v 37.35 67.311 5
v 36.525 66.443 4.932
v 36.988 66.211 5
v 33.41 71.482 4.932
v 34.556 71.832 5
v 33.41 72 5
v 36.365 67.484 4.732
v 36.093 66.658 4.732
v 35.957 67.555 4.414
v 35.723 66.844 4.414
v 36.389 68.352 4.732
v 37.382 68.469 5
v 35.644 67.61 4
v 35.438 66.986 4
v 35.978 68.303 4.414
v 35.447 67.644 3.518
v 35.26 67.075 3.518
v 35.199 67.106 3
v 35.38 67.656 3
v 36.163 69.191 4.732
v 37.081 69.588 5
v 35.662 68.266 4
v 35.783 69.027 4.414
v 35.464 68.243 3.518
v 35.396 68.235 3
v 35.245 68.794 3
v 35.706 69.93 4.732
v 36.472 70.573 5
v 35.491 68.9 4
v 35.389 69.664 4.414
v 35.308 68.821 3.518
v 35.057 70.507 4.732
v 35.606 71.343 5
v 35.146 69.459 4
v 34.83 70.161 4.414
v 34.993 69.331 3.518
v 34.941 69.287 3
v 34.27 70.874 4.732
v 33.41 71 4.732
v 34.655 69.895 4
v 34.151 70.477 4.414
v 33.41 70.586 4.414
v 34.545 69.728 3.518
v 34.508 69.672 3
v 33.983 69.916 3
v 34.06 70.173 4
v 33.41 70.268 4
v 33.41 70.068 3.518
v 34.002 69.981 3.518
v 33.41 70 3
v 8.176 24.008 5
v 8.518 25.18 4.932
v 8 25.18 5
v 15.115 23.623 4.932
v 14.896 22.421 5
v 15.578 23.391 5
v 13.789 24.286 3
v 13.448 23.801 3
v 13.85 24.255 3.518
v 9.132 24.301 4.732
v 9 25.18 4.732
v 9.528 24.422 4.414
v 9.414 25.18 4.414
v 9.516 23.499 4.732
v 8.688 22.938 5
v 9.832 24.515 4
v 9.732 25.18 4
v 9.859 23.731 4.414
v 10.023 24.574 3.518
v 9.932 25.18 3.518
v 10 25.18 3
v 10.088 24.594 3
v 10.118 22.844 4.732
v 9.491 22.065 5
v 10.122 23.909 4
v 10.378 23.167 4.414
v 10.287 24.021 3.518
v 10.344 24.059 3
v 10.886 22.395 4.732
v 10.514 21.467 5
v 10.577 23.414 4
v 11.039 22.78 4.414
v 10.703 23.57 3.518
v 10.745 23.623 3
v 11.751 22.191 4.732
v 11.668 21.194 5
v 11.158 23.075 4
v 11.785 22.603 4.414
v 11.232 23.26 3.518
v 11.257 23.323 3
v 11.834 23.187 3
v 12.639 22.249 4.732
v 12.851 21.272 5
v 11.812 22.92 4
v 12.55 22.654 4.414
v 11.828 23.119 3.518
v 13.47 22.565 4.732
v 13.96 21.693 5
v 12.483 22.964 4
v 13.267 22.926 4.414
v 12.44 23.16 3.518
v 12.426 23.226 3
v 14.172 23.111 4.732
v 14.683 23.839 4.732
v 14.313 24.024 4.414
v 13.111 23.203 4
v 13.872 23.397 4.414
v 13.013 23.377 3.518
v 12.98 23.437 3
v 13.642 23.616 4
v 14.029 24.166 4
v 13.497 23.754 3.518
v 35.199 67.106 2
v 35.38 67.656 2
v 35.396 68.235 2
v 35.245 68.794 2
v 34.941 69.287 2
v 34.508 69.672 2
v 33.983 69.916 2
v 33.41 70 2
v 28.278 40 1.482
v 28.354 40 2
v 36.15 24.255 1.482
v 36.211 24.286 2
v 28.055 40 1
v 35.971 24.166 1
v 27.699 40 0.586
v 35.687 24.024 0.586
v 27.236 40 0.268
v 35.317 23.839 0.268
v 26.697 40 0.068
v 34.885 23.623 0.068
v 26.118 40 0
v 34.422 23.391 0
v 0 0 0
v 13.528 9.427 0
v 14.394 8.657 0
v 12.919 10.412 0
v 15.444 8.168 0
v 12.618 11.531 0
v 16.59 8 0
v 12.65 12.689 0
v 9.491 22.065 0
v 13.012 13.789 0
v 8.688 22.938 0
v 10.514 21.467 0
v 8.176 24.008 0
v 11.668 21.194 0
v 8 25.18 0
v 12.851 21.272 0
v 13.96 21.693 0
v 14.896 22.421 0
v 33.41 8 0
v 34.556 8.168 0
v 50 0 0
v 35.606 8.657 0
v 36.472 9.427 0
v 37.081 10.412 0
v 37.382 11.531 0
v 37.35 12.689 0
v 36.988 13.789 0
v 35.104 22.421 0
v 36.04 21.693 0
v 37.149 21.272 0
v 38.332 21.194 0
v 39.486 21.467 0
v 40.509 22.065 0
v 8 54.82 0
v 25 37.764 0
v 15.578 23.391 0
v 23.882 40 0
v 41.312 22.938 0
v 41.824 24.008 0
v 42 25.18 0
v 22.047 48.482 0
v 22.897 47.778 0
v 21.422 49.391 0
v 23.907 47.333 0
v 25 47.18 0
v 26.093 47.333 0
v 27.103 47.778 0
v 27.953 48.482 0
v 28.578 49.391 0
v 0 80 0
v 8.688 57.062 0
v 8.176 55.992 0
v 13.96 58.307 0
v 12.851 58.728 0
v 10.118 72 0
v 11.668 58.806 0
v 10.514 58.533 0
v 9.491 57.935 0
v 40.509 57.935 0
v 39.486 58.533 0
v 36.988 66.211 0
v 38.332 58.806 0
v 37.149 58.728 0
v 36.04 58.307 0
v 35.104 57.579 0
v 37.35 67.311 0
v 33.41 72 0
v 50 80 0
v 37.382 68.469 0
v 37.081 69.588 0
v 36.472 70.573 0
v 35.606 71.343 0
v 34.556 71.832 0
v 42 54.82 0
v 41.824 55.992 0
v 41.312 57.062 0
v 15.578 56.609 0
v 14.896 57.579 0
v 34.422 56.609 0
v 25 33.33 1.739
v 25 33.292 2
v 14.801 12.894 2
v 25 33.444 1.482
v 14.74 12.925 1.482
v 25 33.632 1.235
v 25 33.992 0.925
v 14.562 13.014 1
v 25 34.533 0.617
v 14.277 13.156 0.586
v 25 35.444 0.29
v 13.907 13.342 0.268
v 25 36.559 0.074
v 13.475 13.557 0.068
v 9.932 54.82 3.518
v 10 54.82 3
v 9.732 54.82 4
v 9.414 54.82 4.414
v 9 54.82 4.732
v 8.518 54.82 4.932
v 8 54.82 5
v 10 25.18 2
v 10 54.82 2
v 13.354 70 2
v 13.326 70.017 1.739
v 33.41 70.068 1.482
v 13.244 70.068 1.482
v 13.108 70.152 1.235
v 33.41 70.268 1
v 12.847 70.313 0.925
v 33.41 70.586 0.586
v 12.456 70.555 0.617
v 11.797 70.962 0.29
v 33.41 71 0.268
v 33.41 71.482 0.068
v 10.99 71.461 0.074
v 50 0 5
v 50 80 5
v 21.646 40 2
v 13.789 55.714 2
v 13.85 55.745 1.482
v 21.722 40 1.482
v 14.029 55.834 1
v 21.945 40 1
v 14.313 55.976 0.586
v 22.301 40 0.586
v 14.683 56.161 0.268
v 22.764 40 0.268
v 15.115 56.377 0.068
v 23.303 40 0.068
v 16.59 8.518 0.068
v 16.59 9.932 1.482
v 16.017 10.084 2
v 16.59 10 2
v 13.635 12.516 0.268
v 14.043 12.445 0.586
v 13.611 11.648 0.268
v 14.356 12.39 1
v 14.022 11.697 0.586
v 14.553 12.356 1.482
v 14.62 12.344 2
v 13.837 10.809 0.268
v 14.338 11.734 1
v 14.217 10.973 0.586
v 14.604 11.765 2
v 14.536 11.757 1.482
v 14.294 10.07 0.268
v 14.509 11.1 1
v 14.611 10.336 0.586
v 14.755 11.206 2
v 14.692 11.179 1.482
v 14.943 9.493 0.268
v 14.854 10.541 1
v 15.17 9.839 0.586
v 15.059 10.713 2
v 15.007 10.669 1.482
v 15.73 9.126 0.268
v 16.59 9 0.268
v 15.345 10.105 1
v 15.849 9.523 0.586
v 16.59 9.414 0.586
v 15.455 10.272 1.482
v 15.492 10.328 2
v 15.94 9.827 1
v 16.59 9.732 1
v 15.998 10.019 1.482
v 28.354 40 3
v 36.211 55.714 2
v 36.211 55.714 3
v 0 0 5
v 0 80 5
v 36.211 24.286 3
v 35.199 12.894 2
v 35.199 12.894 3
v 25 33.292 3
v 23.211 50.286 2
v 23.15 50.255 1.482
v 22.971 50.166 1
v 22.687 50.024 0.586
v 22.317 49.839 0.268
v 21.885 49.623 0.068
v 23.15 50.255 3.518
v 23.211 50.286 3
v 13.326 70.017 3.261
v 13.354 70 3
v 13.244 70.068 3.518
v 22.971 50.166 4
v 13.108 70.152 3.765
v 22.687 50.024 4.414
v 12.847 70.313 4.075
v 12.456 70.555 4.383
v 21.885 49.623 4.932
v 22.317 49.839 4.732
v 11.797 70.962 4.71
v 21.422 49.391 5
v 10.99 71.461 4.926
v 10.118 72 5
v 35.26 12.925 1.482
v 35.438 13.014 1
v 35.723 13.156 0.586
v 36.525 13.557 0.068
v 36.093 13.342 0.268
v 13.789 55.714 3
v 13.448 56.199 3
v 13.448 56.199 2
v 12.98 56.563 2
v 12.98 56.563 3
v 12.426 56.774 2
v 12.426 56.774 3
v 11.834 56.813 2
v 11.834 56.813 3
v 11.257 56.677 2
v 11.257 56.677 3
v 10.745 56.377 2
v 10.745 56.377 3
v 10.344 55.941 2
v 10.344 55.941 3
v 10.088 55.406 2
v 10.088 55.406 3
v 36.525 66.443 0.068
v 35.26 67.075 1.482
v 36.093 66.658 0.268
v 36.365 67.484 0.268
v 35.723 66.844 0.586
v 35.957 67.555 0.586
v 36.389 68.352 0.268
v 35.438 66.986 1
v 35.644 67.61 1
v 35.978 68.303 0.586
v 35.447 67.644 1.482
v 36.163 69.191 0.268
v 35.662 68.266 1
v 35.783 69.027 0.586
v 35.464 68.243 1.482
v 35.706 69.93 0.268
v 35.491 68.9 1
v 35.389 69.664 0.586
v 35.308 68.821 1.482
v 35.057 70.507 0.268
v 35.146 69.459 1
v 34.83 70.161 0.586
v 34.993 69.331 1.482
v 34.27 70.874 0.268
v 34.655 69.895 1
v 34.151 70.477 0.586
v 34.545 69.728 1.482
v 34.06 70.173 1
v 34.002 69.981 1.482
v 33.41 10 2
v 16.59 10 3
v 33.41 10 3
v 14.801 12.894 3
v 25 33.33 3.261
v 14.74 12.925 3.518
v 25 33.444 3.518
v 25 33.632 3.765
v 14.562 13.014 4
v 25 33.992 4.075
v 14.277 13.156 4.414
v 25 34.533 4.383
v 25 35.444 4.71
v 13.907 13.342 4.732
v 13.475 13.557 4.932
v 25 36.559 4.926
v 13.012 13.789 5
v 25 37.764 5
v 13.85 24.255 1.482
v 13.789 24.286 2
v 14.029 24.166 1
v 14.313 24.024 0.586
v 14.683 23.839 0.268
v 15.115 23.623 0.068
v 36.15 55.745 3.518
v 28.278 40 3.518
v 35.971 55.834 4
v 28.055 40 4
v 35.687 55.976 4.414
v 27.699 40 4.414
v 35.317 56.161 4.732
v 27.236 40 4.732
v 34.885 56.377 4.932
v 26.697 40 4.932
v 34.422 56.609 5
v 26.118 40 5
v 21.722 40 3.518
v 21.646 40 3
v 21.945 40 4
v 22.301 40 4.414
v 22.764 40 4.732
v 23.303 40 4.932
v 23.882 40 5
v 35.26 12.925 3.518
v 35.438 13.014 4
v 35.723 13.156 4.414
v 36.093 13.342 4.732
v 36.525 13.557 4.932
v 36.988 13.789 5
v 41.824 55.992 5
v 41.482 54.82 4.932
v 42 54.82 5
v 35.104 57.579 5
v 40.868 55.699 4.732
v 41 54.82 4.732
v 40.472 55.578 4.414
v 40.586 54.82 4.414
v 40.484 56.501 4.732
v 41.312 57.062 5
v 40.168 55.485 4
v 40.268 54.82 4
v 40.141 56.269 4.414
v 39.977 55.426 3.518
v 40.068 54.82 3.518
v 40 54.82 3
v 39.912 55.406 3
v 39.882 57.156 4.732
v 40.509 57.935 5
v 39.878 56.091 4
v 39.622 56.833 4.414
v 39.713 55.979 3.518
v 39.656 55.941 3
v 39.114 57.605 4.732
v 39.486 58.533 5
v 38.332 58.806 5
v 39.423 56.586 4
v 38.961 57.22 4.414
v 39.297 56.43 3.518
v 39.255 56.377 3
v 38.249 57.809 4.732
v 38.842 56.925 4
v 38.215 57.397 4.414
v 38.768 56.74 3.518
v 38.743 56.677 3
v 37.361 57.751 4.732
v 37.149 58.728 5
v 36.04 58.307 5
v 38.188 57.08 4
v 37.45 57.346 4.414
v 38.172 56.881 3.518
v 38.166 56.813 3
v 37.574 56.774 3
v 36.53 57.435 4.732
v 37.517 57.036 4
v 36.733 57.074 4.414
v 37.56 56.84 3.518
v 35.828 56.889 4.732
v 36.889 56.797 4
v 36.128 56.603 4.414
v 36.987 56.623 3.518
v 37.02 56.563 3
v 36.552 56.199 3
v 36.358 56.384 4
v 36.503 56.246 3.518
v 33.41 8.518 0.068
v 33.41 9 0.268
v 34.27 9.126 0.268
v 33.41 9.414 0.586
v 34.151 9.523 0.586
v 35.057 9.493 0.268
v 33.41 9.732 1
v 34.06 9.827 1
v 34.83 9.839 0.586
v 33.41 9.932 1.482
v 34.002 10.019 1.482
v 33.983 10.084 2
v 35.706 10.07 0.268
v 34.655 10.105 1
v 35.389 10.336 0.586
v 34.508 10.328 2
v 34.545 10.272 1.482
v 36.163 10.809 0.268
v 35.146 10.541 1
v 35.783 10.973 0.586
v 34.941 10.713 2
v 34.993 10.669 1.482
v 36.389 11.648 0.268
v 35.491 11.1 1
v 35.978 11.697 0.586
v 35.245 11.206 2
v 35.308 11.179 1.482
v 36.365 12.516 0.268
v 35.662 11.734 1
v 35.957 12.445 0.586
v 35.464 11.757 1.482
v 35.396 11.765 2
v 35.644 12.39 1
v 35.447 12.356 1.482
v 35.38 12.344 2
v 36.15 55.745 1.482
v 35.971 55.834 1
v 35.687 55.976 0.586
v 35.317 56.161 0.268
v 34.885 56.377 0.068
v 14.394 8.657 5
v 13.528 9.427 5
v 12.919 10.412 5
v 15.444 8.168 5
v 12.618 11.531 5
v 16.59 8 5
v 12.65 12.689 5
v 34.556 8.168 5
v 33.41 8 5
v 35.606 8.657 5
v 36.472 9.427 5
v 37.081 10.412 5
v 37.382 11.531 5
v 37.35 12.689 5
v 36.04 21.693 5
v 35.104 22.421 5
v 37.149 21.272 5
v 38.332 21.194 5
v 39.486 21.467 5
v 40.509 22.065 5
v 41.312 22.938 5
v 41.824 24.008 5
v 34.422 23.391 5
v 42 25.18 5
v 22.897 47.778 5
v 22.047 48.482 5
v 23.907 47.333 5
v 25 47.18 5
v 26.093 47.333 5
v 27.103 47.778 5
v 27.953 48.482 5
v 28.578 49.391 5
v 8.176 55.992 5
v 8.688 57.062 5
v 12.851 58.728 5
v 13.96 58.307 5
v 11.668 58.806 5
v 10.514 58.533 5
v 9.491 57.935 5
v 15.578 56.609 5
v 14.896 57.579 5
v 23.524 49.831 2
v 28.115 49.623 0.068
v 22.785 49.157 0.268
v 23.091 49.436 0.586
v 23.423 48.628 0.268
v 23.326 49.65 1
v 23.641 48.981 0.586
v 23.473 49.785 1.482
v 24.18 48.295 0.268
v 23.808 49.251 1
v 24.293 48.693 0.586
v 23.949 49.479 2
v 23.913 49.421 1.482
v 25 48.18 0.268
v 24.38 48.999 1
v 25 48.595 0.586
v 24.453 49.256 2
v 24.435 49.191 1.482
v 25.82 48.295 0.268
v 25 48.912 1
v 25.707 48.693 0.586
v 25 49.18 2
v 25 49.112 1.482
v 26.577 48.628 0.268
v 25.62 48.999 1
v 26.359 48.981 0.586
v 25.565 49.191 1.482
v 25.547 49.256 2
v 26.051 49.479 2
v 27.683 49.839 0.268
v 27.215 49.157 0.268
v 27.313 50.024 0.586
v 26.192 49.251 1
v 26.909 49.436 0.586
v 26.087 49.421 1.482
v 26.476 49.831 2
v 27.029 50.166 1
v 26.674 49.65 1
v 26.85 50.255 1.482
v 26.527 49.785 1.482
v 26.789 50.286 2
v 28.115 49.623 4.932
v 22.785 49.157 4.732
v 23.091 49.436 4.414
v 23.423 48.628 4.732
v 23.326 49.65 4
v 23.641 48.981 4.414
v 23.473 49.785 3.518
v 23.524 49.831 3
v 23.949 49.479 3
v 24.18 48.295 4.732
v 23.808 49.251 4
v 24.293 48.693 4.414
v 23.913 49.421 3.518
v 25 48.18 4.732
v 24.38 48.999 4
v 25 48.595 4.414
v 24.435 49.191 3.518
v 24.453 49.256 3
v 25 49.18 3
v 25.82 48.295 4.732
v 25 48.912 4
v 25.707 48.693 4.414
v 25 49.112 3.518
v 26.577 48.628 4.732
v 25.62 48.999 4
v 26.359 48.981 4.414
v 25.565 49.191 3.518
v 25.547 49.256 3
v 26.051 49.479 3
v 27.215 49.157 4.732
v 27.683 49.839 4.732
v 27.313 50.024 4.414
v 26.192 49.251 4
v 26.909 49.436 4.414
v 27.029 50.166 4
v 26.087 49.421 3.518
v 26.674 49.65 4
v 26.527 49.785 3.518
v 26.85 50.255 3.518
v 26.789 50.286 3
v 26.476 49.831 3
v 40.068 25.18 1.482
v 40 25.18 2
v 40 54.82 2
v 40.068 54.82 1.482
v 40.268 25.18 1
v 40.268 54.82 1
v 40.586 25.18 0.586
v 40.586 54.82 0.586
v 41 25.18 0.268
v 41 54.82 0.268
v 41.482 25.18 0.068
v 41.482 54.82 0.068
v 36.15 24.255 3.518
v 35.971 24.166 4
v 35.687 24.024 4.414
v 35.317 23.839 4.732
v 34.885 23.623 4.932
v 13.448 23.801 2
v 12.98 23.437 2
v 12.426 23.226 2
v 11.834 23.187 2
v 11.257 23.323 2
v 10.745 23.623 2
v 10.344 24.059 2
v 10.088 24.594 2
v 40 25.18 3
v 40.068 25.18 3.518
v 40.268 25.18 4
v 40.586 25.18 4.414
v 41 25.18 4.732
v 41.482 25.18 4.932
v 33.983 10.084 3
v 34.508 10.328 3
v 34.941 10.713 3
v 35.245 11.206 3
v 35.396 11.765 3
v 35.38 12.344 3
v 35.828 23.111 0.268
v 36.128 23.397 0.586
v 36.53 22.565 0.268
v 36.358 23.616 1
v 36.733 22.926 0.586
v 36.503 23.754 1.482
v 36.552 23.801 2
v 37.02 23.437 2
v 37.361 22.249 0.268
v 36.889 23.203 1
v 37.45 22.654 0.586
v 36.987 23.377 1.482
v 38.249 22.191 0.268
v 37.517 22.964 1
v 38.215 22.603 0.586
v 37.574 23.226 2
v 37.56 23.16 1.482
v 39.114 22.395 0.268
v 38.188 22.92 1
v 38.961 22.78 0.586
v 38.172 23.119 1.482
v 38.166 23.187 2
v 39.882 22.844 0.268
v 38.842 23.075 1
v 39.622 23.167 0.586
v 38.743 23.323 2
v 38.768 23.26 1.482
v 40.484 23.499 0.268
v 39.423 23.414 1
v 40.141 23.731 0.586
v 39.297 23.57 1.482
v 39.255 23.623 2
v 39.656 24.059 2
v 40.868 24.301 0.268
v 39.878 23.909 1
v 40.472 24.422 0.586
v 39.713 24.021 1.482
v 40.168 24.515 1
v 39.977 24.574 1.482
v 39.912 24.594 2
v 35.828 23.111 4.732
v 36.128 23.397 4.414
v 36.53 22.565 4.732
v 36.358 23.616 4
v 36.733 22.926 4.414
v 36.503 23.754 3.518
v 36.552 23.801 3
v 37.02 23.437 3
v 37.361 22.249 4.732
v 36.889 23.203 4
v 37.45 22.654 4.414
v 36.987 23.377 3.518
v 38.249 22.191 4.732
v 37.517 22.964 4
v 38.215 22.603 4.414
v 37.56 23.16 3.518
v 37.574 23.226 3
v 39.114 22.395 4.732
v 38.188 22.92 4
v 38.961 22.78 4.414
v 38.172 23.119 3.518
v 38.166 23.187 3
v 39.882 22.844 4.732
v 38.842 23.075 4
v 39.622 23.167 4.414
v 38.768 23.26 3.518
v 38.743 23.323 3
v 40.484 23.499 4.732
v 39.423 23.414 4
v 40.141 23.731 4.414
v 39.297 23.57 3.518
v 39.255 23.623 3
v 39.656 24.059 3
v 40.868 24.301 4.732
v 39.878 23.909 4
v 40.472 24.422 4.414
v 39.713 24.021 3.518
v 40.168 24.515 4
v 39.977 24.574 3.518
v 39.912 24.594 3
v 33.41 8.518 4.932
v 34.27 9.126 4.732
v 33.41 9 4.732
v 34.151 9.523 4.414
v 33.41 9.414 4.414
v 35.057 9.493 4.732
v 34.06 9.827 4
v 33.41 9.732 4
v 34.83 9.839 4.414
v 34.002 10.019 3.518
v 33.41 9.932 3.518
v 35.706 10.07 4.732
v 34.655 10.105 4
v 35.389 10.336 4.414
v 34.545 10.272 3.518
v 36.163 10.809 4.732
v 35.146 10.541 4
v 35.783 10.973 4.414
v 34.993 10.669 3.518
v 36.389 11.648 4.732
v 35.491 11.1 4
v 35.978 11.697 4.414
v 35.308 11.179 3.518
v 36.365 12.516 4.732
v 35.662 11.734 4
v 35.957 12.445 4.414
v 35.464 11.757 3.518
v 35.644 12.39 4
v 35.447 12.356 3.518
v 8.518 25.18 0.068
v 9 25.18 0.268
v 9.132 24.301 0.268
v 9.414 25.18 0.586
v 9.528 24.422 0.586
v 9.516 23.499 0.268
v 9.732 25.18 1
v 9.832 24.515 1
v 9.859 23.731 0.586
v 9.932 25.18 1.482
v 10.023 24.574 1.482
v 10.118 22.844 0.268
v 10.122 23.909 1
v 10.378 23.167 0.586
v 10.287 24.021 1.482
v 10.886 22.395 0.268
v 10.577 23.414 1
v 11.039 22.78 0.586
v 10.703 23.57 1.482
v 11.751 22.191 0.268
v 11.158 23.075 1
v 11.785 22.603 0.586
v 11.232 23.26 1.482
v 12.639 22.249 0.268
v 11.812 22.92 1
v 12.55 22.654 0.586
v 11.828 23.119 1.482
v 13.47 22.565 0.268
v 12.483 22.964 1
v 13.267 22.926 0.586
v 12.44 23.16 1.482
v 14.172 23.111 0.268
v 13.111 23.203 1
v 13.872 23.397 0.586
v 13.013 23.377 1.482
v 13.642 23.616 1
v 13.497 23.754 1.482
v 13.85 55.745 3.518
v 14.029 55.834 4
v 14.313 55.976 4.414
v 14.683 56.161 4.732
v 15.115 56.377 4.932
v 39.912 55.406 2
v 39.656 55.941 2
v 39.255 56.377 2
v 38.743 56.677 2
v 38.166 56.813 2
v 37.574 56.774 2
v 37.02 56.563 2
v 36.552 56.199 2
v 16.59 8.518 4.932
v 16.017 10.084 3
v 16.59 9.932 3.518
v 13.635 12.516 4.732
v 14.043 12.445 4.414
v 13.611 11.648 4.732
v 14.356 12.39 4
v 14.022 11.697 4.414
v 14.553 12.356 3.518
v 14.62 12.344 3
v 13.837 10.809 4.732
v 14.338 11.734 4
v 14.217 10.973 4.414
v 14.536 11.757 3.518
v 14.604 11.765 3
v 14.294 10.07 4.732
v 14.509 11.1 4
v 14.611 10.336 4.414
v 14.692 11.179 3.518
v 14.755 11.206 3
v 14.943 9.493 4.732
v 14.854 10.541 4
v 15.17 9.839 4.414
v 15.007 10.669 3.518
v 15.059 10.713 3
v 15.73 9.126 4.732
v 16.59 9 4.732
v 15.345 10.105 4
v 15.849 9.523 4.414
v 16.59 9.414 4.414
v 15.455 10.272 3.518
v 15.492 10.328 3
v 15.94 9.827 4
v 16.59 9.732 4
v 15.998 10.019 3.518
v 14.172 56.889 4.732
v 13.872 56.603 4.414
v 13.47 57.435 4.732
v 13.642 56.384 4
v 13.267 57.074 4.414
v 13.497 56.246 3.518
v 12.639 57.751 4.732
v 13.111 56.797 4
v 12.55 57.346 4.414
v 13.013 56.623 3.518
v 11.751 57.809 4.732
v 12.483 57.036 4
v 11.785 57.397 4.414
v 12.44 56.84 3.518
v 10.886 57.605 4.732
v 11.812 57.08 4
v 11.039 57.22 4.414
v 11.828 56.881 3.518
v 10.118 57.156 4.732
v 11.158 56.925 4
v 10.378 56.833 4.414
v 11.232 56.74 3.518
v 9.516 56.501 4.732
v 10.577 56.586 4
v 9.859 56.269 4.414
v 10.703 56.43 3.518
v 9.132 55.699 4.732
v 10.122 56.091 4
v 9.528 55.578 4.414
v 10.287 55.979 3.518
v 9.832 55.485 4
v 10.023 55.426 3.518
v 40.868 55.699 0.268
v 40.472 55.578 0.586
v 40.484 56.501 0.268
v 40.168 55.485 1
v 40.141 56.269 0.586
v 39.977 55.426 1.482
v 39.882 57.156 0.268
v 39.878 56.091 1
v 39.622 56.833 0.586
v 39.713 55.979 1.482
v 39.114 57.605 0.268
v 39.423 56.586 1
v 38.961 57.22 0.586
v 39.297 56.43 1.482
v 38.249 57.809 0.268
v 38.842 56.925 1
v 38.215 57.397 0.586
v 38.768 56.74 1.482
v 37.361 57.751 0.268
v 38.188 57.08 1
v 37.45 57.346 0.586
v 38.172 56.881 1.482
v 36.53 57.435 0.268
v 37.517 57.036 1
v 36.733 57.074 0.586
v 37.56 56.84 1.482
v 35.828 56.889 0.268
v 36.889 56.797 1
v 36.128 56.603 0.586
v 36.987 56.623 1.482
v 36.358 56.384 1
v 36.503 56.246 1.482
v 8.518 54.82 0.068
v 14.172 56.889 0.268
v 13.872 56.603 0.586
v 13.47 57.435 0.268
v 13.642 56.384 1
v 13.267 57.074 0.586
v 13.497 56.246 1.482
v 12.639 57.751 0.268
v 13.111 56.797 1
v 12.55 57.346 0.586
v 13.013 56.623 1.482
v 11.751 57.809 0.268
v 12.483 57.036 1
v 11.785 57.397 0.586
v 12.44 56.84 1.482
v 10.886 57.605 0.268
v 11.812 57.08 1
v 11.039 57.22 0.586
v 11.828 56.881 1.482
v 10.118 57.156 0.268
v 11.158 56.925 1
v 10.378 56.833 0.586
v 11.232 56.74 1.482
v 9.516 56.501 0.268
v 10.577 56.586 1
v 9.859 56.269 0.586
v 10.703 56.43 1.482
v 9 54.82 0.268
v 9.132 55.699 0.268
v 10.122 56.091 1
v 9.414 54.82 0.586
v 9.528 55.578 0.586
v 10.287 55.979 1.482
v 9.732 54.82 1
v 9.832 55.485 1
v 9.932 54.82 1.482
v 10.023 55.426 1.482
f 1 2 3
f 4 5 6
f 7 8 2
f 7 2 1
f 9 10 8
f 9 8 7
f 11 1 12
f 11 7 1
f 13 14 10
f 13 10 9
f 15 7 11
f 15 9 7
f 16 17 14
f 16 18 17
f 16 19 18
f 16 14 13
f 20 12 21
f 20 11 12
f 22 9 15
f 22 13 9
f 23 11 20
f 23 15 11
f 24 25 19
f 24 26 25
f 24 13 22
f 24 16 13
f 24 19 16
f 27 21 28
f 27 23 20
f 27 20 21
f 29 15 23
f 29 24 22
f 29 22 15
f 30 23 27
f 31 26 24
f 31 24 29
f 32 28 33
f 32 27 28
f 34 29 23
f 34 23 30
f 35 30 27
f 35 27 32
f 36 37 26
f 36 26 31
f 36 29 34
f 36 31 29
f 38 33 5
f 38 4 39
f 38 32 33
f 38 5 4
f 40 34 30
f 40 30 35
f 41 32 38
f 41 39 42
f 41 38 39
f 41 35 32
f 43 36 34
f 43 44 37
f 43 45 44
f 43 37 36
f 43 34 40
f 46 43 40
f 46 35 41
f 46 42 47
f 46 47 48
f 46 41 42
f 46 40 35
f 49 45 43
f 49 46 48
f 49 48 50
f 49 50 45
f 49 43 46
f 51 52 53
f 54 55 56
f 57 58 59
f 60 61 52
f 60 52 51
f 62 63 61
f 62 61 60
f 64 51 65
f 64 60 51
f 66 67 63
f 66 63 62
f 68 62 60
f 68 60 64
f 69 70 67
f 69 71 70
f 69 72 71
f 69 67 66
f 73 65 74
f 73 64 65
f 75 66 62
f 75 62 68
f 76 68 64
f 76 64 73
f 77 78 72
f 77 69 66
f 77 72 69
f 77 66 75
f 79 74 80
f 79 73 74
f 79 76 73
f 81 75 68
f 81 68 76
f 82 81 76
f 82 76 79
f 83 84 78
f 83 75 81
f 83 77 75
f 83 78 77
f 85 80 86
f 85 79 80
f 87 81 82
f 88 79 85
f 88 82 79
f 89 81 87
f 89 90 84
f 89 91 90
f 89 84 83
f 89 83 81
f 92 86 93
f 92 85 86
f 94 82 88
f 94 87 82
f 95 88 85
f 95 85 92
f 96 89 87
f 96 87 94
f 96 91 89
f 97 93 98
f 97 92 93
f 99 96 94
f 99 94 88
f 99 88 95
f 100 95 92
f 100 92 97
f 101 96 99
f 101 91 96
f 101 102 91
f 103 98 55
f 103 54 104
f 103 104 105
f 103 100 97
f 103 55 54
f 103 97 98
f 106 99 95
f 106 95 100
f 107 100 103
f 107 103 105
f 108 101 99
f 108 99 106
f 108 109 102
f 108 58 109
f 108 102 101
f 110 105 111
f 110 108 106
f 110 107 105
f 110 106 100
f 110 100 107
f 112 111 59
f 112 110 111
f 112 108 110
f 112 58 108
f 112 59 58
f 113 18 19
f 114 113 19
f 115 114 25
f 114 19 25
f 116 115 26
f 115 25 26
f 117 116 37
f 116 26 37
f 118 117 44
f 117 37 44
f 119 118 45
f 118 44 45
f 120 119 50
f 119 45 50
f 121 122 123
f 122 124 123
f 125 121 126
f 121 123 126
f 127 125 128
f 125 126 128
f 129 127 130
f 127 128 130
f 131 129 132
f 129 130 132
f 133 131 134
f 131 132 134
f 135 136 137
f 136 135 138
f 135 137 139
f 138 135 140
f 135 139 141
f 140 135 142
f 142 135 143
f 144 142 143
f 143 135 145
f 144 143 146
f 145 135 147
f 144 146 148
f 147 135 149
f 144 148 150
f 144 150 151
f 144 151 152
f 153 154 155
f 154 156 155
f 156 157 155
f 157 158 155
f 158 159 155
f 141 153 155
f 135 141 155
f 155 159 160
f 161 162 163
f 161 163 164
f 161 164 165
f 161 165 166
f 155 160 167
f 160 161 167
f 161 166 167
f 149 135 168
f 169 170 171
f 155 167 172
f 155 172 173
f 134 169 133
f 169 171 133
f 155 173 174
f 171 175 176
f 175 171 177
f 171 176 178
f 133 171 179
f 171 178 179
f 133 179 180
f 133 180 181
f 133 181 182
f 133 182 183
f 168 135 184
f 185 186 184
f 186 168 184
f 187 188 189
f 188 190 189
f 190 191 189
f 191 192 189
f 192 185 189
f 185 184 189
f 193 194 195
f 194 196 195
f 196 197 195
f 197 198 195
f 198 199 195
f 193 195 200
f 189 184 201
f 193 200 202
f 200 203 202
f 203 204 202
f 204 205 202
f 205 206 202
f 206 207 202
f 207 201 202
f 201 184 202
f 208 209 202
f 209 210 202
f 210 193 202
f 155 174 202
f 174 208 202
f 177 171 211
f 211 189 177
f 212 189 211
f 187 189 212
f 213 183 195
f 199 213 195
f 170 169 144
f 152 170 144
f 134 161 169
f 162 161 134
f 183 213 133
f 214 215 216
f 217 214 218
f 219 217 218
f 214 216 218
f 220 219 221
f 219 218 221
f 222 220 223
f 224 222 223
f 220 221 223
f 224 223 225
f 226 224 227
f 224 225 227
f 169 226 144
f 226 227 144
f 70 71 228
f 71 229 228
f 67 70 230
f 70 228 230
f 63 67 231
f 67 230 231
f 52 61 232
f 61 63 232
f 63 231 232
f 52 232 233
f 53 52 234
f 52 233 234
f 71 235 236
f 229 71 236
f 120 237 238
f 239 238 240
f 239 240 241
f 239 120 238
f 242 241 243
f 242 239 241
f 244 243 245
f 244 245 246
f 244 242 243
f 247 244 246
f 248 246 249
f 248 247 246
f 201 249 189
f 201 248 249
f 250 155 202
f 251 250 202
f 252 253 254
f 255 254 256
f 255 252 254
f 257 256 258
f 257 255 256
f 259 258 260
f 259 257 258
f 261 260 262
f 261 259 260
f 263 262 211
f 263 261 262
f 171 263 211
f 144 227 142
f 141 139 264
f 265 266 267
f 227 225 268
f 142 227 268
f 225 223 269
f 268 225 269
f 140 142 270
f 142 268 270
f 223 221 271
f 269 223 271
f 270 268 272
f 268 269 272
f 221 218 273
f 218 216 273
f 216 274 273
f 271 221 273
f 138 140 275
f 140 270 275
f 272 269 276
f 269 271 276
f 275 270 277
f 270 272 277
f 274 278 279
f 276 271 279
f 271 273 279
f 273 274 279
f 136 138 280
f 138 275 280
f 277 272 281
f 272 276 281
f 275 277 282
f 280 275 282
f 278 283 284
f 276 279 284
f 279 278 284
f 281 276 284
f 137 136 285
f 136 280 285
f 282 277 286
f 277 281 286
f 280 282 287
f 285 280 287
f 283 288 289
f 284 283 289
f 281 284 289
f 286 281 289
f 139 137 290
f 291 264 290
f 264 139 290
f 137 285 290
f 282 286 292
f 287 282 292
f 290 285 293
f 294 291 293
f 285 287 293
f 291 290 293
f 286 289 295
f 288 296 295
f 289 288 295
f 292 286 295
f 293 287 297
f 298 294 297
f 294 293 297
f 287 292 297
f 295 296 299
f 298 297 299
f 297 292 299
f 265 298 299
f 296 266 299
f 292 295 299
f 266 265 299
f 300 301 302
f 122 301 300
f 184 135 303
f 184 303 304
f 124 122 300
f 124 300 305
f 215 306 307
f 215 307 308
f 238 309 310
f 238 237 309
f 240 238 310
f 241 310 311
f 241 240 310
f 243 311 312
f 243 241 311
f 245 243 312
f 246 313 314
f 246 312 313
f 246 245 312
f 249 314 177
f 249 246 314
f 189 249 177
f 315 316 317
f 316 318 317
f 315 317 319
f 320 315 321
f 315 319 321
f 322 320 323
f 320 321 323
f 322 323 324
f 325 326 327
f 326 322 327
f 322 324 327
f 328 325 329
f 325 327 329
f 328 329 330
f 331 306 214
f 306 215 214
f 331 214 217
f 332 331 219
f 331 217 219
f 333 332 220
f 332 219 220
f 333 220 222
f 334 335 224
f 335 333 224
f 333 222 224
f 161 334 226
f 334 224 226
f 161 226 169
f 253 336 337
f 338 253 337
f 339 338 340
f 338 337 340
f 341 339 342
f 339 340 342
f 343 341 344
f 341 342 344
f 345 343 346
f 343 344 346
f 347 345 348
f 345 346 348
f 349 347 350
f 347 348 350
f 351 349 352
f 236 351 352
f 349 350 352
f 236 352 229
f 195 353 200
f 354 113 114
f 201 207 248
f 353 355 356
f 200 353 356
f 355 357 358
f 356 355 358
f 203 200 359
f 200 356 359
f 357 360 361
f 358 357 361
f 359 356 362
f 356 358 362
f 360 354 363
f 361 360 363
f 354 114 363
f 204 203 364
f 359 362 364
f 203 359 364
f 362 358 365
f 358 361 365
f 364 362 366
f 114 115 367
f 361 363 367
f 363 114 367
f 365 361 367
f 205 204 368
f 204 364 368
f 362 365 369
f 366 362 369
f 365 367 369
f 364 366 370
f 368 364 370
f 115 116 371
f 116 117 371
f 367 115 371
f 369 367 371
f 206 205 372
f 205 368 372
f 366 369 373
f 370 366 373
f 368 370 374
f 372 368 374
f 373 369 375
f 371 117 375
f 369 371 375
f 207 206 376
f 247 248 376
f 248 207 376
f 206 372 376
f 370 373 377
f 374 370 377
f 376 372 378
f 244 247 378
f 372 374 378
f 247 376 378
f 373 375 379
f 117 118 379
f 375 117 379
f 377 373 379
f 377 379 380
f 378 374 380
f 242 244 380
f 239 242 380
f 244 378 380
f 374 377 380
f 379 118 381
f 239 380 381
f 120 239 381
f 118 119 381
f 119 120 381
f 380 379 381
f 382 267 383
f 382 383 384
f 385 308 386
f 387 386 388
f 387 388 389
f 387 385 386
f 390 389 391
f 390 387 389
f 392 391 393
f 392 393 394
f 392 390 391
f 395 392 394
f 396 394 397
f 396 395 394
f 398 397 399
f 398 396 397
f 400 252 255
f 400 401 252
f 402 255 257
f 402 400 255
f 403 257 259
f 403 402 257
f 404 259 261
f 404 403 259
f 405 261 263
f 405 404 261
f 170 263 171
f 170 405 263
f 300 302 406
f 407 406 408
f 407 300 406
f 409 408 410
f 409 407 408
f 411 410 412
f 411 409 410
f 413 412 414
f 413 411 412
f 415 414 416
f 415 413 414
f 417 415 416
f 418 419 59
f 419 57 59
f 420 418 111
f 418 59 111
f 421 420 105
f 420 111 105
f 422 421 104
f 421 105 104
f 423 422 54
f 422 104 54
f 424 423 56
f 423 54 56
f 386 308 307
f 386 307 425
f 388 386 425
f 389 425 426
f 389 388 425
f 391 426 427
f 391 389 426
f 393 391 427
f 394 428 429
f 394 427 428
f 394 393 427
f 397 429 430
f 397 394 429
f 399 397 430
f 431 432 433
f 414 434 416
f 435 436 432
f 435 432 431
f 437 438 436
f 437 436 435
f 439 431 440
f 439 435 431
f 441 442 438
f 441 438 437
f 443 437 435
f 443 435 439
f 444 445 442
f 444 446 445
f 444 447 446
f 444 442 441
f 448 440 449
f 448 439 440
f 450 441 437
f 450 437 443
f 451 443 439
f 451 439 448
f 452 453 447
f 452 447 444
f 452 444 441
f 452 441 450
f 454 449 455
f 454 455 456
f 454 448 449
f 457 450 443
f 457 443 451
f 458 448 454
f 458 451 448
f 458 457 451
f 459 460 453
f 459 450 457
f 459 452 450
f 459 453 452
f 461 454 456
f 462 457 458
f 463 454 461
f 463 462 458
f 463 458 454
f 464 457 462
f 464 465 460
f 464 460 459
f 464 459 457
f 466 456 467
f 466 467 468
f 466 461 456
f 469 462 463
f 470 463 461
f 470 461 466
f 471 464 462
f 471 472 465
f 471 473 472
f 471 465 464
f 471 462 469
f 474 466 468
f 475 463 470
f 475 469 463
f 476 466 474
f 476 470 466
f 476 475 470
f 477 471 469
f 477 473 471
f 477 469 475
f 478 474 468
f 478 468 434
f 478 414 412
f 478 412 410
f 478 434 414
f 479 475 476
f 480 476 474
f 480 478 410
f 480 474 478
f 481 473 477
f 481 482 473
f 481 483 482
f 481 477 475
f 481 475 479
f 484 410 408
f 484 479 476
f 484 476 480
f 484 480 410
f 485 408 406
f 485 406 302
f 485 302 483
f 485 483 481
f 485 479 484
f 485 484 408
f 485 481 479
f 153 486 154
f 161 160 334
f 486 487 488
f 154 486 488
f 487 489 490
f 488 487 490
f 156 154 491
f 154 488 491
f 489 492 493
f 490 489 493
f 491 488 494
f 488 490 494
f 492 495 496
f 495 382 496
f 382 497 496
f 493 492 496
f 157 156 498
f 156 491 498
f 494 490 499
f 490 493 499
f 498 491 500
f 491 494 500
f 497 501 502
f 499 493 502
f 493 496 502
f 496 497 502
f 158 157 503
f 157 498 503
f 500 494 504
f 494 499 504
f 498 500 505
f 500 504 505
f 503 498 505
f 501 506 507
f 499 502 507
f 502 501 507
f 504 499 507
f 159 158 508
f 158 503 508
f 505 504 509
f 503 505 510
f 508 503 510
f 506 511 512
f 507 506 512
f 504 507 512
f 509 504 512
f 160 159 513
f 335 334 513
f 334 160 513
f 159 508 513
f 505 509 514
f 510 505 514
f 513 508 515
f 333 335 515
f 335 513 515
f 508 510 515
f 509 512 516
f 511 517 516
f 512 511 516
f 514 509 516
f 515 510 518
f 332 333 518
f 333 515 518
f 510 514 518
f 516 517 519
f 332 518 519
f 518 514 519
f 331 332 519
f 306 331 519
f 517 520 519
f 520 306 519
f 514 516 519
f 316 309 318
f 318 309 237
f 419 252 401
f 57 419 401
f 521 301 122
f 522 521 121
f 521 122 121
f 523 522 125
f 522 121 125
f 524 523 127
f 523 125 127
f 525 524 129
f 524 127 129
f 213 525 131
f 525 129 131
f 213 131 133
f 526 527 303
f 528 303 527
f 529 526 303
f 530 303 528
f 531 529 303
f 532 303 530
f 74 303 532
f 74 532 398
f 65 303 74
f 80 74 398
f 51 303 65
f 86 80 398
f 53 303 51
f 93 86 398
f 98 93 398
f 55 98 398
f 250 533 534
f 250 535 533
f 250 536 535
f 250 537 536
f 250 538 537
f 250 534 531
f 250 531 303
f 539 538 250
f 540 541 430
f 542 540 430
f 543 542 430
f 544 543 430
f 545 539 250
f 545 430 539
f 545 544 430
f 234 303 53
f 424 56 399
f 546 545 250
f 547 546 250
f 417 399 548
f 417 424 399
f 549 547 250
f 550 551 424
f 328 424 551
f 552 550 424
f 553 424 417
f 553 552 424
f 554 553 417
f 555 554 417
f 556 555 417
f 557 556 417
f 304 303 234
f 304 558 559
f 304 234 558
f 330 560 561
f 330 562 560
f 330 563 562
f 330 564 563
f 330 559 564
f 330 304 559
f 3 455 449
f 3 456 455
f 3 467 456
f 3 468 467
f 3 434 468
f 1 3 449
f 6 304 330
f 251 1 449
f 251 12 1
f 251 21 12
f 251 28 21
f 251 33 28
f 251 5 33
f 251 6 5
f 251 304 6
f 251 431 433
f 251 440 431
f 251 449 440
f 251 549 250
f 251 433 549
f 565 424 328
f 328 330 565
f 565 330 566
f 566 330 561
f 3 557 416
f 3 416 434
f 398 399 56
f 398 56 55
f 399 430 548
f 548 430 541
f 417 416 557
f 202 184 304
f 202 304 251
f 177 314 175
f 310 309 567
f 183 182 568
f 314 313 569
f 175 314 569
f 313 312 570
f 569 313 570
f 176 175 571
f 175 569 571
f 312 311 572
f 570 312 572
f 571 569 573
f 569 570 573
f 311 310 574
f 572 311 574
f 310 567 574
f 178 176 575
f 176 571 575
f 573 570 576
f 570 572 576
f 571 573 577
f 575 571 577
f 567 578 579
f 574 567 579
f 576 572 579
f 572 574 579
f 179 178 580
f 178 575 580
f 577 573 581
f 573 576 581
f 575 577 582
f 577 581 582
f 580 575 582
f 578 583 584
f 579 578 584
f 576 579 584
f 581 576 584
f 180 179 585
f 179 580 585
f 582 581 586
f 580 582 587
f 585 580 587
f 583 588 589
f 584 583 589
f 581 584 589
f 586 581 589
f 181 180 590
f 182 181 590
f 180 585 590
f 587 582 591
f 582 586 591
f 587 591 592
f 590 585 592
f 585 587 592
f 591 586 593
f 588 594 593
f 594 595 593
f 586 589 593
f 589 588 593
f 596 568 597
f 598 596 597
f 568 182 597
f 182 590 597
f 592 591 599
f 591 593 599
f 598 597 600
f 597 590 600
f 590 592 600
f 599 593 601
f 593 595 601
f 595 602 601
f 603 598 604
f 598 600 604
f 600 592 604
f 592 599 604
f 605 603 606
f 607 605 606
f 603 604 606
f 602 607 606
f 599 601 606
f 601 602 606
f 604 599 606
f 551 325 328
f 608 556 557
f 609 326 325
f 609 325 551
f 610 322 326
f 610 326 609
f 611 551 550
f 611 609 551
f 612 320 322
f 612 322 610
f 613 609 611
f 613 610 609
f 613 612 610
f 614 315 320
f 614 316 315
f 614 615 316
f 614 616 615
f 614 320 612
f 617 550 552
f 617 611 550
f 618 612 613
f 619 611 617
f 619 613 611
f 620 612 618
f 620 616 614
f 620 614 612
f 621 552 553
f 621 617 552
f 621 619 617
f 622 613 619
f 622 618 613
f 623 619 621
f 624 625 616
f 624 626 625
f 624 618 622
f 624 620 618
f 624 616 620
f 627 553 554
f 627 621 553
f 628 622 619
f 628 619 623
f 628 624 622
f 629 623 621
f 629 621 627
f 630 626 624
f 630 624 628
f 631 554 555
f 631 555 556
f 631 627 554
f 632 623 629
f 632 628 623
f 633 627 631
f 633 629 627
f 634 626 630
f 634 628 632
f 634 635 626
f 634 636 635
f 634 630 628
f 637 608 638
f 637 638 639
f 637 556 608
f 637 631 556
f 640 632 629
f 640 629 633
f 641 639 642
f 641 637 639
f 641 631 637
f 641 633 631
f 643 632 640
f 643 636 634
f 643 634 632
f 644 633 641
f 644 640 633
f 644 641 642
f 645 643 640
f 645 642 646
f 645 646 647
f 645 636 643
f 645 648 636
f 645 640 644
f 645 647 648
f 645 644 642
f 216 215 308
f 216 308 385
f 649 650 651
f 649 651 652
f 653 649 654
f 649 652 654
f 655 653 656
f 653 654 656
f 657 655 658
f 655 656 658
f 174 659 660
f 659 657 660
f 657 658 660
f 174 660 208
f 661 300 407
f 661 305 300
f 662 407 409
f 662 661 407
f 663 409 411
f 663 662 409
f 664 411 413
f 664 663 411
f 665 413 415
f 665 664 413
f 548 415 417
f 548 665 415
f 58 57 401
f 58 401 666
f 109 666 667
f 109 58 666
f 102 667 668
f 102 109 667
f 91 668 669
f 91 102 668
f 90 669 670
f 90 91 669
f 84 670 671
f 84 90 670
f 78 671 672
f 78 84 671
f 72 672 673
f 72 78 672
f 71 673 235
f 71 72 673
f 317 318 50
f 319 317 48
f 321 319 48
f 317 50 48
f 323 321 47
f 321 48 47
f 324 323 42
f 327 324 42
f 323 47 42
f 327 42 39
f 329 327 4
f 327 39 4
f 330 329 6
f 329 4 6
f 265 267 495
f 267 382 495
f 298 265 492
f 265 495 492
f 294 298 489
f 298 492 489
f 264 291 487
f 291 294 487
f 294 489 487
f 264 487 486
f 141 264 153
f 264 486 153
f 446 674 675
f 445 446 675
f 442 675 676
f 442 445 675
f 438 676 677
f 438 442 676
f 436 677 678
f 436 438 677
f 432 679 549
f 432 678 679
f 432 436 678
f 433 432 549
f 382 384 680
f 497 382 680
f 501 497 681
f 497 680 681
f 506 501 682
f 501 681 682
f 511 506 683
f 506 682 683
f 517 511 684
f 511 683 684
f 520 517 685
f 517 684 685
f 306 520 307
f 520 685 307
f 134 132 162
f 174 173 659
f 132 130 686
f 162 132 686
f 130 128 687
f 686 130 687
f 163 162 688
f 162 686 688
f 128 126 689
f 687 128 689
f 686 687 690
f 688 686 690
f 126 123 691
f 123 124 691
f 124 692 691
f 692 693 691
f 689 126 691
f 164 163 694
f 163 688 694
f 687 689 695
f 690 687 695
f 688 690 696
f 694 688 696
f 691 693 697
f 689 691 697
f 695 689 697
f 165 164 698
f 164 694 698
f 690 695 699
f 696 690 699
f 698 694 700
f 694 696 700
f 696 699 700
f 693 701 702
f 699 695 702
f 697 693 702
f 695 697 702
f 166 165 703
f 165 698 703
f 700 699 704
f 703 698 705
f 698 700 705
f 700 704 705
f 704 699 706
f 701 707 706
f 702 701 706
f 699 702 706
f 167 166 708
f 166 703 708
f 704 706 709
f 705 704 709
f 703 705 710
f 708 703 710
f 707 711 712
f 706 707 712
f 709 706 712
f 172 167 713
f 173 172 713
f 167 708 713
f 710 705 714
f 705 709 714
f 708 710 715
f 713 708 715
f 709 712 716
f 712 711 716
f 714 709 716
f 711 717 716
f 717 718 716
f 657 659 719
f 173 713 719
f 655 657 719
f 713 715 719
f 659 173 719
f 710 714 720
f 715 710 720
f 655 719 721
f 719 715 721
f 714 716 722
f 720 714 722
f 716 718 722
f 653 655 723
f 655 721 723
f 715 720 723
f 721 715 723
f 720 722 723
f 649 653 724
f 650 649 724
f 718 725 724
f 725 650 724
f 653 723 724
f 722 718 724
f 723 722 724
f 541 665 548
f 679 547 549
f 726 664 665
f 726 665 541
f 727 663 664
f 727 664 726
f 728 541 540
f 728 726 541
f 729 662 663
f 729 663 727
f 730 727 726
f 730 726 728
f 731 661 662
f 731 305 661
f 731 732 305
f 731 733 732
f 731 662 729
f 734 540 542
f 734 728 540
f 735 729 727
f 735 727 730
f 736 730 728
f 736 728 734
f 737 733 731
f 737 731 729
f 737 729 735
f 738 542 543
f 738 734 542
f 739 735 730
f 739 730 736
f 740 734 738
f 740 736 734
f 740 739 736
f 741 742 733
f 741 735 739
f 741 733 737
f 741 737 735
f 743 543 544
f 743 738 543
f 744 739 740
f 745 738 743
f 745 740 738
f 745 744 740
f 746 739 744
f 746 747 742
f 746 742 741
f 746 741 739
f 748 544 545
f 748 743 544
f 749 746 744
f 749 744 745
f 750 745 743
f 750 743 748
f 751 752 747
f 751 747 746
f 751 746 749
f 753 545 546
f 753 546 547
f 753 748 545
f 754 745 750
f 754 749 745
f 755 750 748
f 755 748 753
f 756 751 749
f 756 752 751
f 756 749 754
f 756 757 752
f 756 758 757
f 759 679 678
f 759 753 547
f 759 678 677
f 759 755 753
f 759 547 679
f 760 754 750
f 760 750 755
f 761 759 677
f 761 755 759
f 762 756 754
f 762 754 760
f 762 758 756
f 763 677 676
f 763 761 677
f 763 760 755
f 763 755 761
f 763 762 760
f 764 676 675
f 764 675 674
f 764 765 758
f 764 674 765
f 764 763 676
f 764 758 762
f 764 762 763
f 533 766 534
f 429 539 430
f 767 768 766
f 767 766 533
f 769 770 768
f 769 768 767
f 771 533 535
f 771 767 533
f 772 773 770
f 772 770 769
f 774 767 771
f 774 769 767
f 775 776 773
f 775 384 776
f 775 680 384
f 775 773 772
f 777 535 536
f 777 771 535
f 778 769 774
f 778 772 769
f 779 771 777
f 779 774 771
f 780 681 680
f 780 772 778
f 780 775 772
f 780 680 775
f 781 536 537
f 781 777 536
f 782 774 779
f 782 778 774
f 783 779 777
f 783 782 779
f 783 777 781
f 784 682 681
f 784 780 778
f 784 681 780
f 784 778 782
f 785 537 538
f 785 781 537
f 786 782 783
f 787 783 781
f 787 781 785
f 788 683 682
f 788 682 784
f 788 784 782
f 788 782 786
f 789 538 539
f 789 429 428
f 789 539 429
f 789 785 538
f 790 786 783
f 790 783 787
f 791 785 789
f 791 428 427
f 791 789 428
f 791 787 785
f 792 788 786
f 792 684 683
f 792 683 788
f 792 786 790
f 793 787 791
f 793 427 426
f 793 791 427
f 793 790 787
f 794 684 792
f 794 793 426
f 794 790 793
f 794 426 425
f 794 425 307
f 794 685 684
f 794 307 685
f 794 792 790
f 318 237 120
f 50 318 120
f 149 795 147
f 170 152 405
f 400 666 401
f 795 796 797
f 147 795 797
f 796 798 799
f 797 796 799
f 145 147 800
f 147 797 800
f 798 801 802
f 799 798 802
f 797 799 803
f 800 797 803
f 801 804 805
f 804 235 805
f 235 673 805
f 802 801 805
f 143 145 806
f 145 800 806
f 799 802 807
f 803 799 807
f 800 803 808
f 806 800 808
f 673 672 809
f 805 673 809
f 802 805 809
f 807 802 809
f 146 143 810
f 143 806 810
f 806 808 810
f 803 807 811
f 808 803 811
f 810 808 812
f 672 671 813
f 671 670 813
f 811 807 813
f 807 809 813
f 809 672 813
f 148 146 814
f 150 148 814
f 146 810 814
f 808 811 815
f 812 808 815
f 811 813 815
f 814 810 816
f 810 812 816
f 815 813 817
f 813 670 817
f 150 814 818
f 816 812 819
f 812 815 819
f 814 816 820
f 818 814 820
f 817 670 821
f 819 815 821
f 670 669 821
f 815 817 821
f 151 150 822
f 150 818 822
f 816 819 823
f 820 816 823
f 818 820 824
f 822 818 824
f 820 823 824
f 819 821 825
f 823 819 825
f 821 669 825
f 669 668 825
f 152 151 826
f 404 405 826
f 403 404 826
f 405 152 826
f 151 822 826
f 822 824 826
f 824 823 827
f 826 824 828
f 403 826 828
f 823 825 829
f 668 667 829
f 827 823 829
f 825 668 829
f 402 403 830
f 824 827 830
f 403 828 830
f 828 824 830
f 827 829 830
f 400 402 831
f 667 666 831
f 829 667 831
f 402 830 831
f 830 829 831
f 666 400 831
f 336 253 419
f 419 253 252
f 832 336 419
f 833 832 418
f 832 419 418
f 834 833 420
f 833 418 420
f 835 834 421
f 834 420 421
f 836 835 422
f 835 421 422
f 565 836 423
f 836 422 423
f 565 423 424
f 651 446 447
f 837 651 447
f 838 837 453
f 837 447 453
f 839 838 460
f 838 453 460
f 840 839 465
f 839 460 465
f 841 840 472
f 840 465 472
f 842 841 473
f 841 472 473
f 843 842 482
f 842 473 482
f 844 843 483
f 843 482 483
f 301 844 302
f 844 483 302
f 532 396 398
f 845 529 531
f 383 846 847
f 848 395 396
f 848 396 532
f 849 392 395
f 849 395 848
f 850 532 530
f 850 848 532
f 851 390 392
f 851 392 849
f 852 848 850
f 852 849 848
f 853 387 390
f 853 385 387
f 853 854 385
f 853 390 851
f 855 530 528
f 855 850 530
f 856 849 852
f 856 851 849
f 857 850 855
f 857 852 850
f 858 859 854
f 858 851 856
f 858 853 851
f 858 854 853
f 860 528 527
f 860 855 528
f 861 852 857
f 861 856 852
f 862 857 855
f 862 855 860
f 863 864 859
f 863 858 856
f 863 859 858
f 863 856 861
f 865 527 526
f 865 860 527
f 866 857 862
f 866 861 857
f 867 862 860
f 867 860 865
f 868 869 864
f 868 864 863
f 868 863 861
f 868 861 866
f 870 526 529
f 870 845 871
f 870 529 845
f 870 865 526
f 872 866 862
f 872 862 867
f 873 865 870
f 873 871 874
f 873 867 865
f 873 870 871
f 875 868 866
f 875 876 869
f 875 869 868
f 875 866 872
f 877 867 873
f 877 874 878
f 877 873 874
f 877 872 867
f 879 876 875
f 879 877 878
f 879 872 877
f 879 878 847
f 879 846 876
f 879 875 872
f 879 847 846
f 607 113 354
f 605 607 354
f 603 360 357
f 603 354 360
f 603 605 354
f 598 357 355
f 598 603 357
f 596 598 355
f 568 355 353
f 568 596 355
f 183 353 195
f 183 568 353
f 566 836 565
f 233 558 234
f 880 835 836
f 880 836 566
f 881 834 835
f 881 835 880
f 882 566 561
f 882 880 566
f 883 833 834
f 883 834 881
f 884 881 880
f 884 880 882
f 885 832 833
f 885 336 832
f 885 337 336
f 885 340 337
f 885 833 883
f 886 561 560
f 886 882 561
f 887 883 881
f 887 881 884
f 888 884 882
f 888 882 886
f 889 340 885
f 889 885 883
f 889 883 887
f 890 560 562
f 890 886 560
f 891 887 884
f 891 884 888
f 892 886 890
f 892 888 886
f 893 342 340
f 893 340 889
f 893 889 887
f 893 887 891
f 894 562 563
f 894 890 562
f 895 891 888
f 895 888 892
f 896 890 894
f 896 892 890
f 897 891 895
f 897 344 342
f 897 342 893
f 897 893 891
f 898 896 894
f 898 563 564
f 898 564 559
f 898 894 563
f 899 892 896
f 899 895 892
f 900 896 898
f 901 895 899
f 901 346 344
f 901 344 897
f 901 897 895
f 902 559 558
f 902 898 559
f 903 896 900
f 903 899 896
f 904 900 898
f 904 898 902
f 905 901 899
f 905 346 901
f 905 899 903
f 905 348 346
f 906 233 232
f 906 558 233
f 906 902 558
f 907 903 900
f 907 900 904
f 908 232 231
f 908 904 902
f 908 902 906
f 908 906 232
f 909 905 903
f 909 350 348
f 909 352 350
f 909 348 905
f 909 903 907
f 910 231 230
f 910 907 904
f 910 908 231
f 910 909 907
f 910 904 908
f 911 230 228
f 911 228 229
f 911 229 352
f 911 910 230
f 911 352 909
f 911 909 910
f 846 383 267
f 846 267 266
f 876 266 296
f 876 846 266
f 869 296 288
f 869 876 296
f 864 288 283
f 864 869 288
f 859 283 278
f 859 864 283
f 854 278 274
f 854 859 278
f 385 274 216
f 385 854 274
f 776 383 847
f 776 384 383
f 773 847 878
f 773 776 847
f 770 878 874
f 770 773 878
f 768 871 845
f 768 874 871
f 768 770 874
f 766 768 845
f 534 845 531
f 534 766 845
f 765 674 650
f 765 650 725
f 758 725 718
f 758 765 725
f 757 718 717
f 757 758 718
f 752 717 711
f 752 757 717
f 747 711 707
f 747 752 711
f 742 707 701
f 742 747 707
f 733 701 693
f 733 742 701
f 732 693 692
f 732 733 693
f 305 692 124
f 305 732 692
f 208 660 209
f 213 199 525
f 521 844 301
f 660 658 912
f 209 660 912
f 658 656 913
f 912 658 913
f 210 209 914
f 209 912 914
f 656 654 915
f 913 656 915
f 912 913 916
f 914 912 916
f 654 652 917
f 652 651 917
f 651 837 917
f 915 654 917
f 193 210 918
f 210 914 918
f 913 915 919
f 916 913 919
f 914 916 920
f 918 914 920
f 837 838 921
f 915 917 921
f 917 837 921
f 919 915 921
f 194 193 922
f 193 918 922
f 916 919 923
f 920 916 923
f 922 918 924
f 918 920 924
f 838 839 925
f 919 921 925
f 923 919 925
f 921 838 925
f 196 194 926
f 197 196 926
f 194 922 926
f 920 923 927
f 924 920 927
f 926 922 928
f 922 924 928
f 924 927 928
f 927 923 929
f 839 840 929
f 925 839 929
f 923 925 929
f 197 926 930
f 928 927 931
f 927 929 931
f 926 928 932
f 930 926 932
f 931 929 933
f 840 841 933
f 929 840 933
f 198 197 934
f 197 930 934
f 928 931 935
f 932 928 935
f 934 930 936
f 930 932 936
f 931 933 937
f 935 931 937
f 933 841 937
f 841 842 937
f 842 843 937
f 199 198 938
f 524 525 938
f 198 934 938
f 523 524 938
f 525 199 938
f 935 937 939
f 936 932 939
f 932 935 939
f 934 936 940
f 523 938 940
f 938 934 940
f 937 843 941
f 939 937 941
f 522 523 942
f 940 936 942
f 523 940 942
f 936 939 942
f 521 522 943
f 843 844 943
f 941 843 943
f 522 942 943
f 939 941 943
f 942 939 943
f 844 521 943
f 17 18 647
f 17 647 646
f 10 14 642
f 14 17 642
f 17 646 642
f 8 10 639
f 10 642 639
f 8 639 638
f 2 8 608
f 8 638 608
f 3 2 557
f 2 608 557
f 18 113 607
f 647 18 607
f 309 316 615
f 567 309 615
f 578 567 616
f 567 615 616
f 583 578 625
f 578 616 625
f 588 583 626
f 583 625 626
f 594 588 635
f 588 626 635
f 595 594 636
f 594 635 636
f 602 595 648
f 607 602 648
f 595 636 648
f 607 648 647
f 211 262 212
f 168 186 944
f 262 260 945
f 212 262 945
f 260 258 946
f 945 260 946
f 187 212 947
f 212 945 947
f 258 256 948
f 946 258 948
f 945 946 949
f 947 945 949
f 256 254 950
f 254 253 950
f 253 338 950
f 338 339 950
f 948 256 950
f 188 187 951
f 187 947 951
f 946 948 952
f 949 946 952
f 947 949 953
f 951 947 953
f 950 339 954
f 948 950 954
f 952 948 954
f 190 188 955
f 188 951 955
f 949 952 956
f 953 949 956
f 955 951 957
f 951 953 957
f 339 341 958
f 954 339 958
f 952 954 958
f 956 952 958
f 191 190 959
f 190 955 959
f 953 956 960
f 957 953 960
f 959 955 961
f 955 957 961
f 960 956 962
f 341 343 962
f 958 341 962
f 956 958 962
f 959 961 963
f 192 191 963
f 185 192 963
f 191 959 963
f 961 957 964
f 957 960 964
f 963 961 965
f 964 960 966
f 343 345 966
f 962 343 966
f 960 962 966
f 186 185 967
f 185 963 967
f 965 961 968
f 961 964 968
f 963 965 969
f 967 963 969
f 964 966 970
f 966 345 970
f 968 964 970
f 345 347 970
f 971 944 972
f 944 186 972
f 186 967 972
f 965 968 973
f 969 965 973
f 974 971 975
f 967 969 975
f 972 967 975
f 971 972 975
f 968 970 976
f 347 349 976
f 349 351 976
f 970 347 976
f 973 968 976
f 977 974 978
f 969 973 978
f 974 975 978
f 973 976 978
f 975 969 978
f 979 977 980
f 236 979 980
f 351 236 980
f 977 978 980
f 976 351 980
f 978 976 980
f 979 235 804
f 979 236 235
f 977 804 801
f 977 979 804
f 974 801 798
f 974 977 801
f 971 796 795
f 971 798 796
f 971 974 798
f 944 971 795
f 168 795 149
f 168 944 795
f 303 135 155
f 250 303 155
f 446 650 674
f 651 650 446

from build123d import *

# Parameters (mm, degrees)
SKETCH1_W           = 50
SKETCH1_H           = 80
BOSS_EXTRUDE1_DEPTH = 5
FILLET1_R           = 2


with BuildPart() as part:
    # Sketch1 → Boss-Extrude1 (new body)
    with BuildSketch(Plane.XY):
        with Locations((25, 40)):
            Rectangle(SKETCH1_W, SKETCH1_H)
        Polygon((10, 16.708203932), (10, 63.291796068), (21.645898034, 40), align=None, mode=Mode.SUBTRACT)
        Polygon((13.354101966, 70), (36.645898034, 70), (25, 46.708203932), align=None, mode=Mode.SUBTRACT)
        Polygon((40, 16.708203932), (40, 63.291796068), (28.354101966, 40), align=None, mode=Mode.SUBTRACT)
        Polygon((13.354101966, 10), (36.645898034, 10), (25, 33.291796068), align=None, mode=Mode.SUBTRACT)
    extrude(amount=BOSS_EXTRUDE1_DEPTH)

    # Fillet1
    fillet1_edges = [part.edges().sort_by_distance(p)[0] for p in [
        (15.822949017, 51.645898034, 0),
        (10, 40, 0),
        (10, 63.291796068, 2.5),
        (15.822949017, 28.354101966, 0),
        (10, 16.708203932, 2.5),
        (15.822949017, 51.645898034, 5),
        (10, 40, 5),
        (15.822949017, 28.354101966, 5),
        (19.177050983, 58.354101966, 0),
        (30.822949017, 58.354101966, 0),
        (25, 46.708203932, 2.5),
        (25, 70, 0),
        (36.645898034, 70, 2.5),
        (19.177050983, 58.354101966, 5),
        (30.822949017, 58.354101966, 5),
        (25, 70, 5),
        (19.177050983, 21.645898034, 0),
        (25, 10, 0),
        (13.354101966, 10, 2.5),
        (30.822949017, 21.645898034, 0),
        (36.645898034, 10, 2.5),
        (19.177050983, 21.645898034, 5),
        (25, 10, 5),
        (30.822949017, 21.645898034, 5),
        (34.177050983, 28.354101966, 0),
        (40, 40, 0),
        (40, 16.708203932, 2.5),
        (34.177050983, 51.645898034, 0),
        (40, 63.291796068, 2.5),
        (34.177050983, 28.354101966, 5),
        (40, 40, 5),
        (34.177050983, 51.645898034, 5),
    ]]
    fillet(fillet1_edges, radius=FILLET1_R)


solid = part.part
